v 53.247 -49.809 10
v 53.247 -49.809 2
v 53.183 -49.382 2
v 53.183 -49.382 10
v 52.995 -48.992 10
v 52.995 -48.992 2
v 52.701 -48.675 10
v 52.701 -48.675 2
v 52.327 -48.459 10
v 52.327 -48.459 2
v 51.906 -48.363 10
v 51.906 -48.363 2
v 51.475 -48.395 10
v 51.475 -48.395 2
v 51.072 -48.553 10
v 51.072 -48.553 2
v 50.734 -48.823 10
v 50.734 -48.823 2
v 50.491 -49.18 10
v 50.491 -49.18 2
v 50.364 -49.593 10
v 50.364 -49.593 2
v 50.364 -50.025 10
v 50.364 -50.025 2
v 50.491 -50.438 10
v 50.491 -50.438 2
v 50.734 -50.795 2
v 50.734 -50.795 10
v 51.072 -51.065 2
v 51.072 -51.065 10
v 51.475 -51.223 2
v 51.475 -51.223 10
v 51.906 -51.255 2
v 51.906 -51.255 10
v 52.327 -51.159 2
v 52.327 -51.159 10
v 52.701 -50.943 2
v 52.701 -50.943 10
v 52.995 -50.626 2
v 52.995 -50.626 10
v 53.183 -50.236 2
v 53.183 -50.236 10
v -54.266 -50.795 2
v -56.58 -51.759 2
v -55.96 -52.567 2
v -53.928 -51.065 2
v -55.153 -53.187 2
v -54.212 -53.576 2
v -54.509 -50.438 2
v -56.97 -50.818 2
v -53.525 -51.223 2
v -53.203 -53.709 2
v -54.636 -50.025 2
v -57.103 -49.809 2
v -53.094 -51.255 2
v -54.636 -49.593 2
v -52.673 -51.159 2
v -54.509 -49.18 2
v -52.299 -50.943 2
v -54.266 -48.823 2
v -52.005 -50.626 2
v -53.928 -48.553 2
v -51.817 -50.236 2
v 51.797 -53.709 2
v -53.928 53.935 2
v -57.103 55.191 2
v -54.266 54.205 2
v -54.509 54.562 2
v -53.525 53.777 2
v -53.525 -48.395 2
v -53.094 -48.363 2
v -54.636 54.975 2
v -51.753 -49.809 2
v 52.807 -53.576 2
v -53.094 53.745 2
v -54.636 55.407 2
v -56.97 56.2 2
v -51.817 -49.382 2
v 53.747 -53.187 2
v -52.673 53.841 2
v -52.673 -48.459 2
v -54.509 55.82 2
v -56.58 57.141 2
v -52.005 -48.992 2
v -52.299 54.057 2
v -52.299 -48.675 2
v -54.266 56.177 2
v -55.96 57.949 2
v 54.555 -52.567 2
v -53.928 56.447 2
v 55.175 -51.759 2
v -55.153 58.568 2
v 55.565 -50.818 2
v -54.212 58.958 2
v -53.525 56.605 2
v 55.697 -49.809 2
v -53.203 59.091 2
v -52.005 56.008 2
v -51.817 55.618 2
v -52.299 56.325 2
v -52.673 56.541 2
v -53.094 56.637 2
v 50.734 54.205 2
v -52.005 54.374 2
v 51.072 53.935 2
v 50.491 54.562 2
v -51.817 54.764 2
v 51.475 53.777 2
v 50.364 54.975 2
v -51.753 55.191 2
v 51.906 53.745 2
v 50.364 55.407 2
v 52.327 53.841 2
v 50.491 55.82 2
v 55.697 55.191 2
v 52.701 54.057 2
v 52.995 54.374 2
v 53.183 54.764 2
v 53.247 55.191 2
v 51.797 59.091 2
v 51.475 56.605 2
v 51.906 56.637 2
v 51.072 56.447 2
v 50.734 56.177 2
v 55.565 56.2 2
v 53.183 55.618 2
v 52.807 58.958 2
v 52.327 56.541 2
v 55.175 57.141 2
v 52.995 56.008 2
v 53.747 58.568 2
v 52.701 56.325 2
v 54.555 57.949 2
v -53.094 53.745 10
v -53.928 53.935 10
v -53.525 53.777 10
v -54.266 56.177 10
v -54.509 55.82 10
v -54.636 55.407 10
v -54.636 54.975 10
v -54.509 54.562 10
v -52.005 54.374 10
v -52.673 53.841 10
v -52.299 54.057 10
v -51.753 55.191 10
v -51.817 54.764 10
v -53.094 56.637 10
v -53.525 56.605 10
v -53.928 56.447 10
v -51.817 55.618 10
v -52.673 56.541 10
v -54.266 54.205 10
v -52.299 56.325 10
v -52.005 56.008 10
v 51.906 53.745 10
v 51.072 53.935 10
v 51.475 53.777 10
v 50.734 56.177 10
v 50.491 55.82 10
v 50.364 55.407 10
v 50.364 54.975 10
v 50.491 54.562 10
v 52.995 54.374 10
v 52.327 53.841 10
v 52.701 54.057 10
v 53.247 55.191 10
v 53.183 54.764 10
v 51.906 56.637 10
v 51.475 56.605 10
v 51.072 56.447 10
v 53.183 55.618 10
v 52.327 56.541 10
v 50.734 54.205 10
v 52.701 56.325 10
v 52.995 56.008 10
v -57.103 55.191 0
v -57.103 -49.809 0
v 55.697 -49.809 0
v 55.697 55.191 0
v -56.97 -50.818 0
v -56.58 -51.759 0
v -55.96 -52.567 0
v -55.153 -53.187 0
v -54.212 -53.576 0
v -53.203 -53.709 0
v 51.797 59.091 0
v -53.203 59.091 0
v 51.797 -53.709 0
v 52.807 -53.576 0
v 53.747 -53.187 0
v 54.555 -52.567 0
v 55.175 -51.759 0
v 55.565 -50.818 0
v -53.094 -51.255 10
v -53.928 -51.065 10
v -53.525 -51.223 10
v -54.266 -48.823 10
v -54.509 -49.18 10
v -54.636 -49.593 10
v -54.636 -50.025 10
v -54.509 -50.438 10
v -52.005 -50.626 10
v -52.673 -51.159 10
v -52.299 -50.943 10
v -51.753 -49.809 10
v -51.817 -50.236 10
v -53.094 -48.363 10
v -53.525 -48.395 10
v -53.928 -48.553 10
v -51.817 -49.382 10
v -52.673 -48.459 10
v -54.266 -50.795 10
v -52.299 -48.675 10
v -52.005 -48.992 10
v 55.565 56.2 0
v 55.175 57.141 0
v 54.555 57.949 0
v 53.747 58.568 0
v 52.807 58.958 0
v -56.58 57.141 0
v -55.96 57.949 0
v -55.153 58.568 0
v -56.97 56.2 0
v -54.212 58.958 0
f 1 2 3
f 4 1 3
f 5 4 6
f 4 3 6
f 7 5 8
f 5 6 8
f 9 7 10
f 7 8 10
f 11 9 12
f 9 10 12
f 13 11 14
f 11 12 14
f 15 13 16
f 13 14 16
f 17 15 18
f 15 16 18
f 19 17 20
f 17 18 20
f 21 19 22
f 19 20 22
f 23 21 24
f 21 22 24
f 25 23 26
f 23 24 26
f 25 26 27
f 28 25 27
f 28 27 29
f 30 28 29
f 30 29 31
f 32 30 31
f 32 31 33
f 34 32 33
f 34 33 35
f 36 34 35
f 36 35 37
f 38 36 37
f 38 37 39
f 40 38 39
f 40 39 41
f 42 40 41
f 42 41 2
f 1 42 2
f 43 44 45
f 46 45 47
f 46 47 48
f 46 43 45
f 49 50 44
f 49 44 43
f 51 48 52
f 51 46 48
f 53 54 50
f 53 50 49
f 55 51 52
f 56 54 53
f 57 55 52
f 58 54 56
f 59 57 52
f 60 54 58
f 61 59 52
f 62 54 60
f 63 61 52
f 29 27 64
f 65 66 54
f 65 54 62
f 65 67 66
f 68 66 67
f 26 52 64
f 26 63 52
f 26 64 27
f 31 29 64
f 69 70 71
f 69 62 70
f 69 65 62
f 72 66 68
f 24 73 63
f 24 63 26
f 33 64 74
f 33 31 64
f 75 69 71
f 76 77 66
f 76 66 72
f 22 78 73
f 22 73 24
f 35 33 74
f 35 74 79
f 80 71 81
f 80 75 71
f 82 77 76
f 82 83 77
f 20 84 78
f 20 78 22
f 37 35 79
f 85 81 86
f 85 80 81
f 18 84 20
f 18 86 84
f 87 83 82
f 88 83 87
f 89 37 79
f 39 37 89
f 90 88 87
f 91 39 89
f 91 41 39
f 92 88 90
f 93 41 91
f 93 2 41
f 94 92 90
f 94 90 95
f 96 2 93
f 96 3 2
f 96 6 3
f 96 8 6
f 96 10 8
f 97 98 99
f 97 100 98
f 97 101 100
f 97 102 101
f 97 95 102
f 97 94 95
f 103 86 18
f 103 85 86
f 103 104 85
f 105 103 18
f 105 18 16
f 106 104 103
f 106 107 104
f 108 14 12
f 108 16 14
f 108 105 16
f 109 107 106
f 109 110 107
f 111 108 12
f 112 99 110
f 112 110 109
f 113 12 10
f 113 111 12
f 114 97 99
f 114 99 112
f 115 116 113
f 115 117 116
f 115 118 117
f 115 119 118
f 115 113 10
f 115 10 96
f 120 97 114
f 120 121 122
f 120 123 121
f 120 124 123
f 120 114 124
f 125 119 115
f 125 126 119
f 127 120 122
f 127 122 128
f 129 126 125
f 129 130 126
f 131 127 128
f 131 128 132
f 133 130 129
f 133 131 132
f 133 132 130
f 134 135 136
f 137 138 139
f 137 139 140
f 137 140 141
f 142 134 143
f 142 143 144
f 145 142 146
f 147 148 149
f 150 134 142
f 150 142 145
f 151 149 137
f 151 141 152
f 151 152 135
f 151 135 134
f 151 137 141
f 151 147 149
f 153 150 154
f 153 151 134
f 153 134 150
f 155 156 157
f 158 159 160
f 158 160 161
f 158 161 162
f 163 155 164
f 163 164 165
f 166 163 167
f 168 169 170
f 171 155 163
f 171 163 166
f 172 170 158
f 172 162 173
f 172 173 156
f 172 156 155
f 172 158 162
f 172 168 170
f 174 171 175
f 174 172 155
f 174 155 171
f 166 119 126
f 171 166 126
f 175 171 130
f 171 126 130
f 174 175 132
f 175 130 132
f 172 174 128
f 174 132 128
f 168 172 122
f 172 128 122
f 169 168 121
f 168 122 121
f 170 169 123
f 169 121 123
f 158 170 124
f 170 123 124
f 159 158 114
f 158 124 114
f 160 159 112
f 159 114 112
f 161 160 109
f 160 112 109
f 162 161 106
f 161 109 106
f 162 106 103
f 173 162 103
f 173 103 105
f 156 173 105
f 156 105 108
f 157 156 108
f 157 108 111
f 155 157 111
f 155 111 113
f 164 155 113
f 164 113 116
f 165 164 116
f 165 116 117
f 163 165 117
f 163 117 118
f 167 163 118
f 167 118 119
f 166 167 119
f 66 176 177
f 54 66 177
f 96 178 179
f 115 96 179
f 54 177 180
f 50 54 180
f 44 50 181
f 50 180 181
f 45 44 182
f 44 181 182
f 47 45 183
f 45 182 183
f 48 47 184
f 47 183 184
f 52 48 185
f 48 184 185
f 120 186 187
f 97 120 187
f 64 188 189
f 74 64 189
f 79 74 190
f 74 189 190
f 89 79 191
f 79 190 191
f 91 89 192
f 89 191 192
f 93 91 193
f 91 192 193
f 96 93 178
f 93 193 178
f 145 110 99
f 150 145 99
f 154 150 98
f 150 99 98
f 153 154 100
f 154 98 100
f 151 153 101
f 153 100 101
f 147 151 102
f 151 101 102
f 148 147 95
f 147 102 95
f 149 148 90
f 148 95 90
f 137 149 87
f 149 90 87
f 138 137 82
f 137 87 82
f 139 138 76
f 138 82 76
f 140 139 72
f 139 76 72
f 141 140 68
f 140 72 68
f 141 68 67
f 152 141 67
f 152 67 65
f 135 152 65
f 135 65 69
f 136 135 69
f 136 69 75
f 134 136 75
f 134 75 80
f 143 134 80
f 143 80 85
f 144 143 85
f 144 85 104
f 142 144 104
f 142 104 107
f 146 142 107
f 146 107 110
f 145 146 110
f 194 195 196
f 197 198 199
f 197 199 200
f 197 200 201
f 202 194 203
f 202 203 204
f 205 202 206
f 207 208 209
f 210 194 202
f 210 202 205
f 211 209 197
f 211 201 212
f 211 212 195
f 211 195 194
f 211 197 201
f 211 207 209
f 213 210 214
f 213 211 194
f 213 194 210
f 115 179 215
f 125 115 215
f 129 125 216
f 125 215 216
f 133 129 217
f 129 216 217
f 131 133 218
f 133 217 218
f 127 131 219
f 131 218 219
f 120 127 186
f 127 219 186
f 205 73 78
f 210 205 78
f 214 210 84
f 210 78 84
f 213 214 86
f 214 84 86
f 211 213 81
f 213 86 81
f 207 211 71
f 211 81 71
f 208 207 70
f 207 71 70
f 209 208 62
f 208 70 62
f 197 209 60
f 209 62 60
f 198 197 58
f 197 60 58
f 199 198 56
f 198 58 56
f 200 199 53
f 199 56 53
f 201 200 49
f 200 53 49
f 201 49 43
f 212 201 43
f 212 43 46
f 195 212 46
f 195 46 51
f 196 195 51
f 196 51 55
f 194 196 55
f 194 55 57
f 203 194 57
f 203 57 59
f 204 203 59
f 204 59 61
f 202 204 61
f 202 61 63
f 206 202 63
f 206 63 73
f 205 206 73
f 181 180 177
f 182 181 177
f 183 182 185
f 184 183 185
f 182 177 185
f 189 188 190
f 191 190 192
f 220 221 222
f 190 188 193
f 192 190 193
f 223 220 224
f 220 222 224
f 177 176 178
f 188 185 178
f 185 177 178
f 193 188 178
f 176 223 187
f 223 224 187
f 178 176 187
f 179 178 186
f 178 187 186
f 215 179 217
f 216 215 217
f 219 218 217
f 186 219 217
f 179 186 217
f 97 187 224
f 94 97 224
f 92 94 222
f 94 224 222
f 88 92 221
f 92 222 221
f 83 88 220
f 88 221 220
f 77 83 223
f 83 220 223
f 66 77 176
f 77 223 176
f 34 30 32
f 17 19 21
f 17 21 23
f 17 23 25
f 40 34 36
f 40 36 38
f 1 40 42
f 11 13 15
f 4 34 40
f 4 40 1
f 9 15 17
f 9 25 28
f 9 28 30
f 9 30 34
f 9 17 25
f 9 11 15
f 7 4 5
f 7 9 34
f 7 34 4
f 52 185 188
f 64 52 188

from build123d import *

# Parameters (mm, degrees)
F1_R     = 1.45
F2_DEPTH = 2
F3_DEPTH = 10


with BuildPart() as f2:
    # F1 (on Top) → F2 (new body)
    with BuildSketch(Plane.XY):
        with BuildLine():
            ThreePointArc((-53.202599287, 59.0909458041), (-55.9603157337, 57.9486622507), (-57.102599287, 55.1909458041))
            Line((-57.102599287, 55.1909458041), (-57.102599287, -49.8090541959))
            ThreePointArc((-57.102599287, -49.8090541959), (-55.9603157337, -52.5667706425), (-53.202599287, -53.7090541959))
            Line((-53.202599287, -53.7090541959), (51.797400713, -53.7090541959))
            ThreePointArc((51.797400713, -53.7090541959), (54.5551171596, -52.5667706425), (55.697400713, -49.8090541959))
            Line((55.697400713, -49.8090541959), (55.697400713, 55.1909458041))
            ThreePointArc((55.697400713, 55.1909458041), (54.5551171596, 57.9486622507), (51.797400713, 59.0909458041))
            Line((51.797400713, 59.0909458041), (-53.202599287, 59.0909458041))
        make_face()
        with Locations((-53.202599287, -49.8090541959)):
            Circle(F1_R, mode=Mode.SUBTRACT)
        with Locations((51.797400713, -49.8090541959)):
            Circle(F1_R, mode=Mode.SUBTRACT)
        with Locations((-53.202599287, 55.1909458041)):
            Circle(F1_R, mode=Mode.SUBTRACT)
        with Locations((51.797400713, 55.1909458041)):
            Circle(F1_R, mode=Mode.SUBTRACT)
    extrude(amount=F2_DEPTH)

    # F1 (on Top) → F3 (join)
    with BuildSketch(Plane.XY):
        with Locations((-53.202599287, 55.1909458041)):
            Circle(F1_R)
        with Locations((51.797400713, 55.1909458041)):
            Circle(F1_R)
        with Locations((-53.202599287, -49.8090541959)):
            Circle(F1_R)
        with Locations((51.797400713, -49.8090541959)):
            Circle(F1_R)
    extrude(amount=F3_DEPTH)


solid = f2.part
